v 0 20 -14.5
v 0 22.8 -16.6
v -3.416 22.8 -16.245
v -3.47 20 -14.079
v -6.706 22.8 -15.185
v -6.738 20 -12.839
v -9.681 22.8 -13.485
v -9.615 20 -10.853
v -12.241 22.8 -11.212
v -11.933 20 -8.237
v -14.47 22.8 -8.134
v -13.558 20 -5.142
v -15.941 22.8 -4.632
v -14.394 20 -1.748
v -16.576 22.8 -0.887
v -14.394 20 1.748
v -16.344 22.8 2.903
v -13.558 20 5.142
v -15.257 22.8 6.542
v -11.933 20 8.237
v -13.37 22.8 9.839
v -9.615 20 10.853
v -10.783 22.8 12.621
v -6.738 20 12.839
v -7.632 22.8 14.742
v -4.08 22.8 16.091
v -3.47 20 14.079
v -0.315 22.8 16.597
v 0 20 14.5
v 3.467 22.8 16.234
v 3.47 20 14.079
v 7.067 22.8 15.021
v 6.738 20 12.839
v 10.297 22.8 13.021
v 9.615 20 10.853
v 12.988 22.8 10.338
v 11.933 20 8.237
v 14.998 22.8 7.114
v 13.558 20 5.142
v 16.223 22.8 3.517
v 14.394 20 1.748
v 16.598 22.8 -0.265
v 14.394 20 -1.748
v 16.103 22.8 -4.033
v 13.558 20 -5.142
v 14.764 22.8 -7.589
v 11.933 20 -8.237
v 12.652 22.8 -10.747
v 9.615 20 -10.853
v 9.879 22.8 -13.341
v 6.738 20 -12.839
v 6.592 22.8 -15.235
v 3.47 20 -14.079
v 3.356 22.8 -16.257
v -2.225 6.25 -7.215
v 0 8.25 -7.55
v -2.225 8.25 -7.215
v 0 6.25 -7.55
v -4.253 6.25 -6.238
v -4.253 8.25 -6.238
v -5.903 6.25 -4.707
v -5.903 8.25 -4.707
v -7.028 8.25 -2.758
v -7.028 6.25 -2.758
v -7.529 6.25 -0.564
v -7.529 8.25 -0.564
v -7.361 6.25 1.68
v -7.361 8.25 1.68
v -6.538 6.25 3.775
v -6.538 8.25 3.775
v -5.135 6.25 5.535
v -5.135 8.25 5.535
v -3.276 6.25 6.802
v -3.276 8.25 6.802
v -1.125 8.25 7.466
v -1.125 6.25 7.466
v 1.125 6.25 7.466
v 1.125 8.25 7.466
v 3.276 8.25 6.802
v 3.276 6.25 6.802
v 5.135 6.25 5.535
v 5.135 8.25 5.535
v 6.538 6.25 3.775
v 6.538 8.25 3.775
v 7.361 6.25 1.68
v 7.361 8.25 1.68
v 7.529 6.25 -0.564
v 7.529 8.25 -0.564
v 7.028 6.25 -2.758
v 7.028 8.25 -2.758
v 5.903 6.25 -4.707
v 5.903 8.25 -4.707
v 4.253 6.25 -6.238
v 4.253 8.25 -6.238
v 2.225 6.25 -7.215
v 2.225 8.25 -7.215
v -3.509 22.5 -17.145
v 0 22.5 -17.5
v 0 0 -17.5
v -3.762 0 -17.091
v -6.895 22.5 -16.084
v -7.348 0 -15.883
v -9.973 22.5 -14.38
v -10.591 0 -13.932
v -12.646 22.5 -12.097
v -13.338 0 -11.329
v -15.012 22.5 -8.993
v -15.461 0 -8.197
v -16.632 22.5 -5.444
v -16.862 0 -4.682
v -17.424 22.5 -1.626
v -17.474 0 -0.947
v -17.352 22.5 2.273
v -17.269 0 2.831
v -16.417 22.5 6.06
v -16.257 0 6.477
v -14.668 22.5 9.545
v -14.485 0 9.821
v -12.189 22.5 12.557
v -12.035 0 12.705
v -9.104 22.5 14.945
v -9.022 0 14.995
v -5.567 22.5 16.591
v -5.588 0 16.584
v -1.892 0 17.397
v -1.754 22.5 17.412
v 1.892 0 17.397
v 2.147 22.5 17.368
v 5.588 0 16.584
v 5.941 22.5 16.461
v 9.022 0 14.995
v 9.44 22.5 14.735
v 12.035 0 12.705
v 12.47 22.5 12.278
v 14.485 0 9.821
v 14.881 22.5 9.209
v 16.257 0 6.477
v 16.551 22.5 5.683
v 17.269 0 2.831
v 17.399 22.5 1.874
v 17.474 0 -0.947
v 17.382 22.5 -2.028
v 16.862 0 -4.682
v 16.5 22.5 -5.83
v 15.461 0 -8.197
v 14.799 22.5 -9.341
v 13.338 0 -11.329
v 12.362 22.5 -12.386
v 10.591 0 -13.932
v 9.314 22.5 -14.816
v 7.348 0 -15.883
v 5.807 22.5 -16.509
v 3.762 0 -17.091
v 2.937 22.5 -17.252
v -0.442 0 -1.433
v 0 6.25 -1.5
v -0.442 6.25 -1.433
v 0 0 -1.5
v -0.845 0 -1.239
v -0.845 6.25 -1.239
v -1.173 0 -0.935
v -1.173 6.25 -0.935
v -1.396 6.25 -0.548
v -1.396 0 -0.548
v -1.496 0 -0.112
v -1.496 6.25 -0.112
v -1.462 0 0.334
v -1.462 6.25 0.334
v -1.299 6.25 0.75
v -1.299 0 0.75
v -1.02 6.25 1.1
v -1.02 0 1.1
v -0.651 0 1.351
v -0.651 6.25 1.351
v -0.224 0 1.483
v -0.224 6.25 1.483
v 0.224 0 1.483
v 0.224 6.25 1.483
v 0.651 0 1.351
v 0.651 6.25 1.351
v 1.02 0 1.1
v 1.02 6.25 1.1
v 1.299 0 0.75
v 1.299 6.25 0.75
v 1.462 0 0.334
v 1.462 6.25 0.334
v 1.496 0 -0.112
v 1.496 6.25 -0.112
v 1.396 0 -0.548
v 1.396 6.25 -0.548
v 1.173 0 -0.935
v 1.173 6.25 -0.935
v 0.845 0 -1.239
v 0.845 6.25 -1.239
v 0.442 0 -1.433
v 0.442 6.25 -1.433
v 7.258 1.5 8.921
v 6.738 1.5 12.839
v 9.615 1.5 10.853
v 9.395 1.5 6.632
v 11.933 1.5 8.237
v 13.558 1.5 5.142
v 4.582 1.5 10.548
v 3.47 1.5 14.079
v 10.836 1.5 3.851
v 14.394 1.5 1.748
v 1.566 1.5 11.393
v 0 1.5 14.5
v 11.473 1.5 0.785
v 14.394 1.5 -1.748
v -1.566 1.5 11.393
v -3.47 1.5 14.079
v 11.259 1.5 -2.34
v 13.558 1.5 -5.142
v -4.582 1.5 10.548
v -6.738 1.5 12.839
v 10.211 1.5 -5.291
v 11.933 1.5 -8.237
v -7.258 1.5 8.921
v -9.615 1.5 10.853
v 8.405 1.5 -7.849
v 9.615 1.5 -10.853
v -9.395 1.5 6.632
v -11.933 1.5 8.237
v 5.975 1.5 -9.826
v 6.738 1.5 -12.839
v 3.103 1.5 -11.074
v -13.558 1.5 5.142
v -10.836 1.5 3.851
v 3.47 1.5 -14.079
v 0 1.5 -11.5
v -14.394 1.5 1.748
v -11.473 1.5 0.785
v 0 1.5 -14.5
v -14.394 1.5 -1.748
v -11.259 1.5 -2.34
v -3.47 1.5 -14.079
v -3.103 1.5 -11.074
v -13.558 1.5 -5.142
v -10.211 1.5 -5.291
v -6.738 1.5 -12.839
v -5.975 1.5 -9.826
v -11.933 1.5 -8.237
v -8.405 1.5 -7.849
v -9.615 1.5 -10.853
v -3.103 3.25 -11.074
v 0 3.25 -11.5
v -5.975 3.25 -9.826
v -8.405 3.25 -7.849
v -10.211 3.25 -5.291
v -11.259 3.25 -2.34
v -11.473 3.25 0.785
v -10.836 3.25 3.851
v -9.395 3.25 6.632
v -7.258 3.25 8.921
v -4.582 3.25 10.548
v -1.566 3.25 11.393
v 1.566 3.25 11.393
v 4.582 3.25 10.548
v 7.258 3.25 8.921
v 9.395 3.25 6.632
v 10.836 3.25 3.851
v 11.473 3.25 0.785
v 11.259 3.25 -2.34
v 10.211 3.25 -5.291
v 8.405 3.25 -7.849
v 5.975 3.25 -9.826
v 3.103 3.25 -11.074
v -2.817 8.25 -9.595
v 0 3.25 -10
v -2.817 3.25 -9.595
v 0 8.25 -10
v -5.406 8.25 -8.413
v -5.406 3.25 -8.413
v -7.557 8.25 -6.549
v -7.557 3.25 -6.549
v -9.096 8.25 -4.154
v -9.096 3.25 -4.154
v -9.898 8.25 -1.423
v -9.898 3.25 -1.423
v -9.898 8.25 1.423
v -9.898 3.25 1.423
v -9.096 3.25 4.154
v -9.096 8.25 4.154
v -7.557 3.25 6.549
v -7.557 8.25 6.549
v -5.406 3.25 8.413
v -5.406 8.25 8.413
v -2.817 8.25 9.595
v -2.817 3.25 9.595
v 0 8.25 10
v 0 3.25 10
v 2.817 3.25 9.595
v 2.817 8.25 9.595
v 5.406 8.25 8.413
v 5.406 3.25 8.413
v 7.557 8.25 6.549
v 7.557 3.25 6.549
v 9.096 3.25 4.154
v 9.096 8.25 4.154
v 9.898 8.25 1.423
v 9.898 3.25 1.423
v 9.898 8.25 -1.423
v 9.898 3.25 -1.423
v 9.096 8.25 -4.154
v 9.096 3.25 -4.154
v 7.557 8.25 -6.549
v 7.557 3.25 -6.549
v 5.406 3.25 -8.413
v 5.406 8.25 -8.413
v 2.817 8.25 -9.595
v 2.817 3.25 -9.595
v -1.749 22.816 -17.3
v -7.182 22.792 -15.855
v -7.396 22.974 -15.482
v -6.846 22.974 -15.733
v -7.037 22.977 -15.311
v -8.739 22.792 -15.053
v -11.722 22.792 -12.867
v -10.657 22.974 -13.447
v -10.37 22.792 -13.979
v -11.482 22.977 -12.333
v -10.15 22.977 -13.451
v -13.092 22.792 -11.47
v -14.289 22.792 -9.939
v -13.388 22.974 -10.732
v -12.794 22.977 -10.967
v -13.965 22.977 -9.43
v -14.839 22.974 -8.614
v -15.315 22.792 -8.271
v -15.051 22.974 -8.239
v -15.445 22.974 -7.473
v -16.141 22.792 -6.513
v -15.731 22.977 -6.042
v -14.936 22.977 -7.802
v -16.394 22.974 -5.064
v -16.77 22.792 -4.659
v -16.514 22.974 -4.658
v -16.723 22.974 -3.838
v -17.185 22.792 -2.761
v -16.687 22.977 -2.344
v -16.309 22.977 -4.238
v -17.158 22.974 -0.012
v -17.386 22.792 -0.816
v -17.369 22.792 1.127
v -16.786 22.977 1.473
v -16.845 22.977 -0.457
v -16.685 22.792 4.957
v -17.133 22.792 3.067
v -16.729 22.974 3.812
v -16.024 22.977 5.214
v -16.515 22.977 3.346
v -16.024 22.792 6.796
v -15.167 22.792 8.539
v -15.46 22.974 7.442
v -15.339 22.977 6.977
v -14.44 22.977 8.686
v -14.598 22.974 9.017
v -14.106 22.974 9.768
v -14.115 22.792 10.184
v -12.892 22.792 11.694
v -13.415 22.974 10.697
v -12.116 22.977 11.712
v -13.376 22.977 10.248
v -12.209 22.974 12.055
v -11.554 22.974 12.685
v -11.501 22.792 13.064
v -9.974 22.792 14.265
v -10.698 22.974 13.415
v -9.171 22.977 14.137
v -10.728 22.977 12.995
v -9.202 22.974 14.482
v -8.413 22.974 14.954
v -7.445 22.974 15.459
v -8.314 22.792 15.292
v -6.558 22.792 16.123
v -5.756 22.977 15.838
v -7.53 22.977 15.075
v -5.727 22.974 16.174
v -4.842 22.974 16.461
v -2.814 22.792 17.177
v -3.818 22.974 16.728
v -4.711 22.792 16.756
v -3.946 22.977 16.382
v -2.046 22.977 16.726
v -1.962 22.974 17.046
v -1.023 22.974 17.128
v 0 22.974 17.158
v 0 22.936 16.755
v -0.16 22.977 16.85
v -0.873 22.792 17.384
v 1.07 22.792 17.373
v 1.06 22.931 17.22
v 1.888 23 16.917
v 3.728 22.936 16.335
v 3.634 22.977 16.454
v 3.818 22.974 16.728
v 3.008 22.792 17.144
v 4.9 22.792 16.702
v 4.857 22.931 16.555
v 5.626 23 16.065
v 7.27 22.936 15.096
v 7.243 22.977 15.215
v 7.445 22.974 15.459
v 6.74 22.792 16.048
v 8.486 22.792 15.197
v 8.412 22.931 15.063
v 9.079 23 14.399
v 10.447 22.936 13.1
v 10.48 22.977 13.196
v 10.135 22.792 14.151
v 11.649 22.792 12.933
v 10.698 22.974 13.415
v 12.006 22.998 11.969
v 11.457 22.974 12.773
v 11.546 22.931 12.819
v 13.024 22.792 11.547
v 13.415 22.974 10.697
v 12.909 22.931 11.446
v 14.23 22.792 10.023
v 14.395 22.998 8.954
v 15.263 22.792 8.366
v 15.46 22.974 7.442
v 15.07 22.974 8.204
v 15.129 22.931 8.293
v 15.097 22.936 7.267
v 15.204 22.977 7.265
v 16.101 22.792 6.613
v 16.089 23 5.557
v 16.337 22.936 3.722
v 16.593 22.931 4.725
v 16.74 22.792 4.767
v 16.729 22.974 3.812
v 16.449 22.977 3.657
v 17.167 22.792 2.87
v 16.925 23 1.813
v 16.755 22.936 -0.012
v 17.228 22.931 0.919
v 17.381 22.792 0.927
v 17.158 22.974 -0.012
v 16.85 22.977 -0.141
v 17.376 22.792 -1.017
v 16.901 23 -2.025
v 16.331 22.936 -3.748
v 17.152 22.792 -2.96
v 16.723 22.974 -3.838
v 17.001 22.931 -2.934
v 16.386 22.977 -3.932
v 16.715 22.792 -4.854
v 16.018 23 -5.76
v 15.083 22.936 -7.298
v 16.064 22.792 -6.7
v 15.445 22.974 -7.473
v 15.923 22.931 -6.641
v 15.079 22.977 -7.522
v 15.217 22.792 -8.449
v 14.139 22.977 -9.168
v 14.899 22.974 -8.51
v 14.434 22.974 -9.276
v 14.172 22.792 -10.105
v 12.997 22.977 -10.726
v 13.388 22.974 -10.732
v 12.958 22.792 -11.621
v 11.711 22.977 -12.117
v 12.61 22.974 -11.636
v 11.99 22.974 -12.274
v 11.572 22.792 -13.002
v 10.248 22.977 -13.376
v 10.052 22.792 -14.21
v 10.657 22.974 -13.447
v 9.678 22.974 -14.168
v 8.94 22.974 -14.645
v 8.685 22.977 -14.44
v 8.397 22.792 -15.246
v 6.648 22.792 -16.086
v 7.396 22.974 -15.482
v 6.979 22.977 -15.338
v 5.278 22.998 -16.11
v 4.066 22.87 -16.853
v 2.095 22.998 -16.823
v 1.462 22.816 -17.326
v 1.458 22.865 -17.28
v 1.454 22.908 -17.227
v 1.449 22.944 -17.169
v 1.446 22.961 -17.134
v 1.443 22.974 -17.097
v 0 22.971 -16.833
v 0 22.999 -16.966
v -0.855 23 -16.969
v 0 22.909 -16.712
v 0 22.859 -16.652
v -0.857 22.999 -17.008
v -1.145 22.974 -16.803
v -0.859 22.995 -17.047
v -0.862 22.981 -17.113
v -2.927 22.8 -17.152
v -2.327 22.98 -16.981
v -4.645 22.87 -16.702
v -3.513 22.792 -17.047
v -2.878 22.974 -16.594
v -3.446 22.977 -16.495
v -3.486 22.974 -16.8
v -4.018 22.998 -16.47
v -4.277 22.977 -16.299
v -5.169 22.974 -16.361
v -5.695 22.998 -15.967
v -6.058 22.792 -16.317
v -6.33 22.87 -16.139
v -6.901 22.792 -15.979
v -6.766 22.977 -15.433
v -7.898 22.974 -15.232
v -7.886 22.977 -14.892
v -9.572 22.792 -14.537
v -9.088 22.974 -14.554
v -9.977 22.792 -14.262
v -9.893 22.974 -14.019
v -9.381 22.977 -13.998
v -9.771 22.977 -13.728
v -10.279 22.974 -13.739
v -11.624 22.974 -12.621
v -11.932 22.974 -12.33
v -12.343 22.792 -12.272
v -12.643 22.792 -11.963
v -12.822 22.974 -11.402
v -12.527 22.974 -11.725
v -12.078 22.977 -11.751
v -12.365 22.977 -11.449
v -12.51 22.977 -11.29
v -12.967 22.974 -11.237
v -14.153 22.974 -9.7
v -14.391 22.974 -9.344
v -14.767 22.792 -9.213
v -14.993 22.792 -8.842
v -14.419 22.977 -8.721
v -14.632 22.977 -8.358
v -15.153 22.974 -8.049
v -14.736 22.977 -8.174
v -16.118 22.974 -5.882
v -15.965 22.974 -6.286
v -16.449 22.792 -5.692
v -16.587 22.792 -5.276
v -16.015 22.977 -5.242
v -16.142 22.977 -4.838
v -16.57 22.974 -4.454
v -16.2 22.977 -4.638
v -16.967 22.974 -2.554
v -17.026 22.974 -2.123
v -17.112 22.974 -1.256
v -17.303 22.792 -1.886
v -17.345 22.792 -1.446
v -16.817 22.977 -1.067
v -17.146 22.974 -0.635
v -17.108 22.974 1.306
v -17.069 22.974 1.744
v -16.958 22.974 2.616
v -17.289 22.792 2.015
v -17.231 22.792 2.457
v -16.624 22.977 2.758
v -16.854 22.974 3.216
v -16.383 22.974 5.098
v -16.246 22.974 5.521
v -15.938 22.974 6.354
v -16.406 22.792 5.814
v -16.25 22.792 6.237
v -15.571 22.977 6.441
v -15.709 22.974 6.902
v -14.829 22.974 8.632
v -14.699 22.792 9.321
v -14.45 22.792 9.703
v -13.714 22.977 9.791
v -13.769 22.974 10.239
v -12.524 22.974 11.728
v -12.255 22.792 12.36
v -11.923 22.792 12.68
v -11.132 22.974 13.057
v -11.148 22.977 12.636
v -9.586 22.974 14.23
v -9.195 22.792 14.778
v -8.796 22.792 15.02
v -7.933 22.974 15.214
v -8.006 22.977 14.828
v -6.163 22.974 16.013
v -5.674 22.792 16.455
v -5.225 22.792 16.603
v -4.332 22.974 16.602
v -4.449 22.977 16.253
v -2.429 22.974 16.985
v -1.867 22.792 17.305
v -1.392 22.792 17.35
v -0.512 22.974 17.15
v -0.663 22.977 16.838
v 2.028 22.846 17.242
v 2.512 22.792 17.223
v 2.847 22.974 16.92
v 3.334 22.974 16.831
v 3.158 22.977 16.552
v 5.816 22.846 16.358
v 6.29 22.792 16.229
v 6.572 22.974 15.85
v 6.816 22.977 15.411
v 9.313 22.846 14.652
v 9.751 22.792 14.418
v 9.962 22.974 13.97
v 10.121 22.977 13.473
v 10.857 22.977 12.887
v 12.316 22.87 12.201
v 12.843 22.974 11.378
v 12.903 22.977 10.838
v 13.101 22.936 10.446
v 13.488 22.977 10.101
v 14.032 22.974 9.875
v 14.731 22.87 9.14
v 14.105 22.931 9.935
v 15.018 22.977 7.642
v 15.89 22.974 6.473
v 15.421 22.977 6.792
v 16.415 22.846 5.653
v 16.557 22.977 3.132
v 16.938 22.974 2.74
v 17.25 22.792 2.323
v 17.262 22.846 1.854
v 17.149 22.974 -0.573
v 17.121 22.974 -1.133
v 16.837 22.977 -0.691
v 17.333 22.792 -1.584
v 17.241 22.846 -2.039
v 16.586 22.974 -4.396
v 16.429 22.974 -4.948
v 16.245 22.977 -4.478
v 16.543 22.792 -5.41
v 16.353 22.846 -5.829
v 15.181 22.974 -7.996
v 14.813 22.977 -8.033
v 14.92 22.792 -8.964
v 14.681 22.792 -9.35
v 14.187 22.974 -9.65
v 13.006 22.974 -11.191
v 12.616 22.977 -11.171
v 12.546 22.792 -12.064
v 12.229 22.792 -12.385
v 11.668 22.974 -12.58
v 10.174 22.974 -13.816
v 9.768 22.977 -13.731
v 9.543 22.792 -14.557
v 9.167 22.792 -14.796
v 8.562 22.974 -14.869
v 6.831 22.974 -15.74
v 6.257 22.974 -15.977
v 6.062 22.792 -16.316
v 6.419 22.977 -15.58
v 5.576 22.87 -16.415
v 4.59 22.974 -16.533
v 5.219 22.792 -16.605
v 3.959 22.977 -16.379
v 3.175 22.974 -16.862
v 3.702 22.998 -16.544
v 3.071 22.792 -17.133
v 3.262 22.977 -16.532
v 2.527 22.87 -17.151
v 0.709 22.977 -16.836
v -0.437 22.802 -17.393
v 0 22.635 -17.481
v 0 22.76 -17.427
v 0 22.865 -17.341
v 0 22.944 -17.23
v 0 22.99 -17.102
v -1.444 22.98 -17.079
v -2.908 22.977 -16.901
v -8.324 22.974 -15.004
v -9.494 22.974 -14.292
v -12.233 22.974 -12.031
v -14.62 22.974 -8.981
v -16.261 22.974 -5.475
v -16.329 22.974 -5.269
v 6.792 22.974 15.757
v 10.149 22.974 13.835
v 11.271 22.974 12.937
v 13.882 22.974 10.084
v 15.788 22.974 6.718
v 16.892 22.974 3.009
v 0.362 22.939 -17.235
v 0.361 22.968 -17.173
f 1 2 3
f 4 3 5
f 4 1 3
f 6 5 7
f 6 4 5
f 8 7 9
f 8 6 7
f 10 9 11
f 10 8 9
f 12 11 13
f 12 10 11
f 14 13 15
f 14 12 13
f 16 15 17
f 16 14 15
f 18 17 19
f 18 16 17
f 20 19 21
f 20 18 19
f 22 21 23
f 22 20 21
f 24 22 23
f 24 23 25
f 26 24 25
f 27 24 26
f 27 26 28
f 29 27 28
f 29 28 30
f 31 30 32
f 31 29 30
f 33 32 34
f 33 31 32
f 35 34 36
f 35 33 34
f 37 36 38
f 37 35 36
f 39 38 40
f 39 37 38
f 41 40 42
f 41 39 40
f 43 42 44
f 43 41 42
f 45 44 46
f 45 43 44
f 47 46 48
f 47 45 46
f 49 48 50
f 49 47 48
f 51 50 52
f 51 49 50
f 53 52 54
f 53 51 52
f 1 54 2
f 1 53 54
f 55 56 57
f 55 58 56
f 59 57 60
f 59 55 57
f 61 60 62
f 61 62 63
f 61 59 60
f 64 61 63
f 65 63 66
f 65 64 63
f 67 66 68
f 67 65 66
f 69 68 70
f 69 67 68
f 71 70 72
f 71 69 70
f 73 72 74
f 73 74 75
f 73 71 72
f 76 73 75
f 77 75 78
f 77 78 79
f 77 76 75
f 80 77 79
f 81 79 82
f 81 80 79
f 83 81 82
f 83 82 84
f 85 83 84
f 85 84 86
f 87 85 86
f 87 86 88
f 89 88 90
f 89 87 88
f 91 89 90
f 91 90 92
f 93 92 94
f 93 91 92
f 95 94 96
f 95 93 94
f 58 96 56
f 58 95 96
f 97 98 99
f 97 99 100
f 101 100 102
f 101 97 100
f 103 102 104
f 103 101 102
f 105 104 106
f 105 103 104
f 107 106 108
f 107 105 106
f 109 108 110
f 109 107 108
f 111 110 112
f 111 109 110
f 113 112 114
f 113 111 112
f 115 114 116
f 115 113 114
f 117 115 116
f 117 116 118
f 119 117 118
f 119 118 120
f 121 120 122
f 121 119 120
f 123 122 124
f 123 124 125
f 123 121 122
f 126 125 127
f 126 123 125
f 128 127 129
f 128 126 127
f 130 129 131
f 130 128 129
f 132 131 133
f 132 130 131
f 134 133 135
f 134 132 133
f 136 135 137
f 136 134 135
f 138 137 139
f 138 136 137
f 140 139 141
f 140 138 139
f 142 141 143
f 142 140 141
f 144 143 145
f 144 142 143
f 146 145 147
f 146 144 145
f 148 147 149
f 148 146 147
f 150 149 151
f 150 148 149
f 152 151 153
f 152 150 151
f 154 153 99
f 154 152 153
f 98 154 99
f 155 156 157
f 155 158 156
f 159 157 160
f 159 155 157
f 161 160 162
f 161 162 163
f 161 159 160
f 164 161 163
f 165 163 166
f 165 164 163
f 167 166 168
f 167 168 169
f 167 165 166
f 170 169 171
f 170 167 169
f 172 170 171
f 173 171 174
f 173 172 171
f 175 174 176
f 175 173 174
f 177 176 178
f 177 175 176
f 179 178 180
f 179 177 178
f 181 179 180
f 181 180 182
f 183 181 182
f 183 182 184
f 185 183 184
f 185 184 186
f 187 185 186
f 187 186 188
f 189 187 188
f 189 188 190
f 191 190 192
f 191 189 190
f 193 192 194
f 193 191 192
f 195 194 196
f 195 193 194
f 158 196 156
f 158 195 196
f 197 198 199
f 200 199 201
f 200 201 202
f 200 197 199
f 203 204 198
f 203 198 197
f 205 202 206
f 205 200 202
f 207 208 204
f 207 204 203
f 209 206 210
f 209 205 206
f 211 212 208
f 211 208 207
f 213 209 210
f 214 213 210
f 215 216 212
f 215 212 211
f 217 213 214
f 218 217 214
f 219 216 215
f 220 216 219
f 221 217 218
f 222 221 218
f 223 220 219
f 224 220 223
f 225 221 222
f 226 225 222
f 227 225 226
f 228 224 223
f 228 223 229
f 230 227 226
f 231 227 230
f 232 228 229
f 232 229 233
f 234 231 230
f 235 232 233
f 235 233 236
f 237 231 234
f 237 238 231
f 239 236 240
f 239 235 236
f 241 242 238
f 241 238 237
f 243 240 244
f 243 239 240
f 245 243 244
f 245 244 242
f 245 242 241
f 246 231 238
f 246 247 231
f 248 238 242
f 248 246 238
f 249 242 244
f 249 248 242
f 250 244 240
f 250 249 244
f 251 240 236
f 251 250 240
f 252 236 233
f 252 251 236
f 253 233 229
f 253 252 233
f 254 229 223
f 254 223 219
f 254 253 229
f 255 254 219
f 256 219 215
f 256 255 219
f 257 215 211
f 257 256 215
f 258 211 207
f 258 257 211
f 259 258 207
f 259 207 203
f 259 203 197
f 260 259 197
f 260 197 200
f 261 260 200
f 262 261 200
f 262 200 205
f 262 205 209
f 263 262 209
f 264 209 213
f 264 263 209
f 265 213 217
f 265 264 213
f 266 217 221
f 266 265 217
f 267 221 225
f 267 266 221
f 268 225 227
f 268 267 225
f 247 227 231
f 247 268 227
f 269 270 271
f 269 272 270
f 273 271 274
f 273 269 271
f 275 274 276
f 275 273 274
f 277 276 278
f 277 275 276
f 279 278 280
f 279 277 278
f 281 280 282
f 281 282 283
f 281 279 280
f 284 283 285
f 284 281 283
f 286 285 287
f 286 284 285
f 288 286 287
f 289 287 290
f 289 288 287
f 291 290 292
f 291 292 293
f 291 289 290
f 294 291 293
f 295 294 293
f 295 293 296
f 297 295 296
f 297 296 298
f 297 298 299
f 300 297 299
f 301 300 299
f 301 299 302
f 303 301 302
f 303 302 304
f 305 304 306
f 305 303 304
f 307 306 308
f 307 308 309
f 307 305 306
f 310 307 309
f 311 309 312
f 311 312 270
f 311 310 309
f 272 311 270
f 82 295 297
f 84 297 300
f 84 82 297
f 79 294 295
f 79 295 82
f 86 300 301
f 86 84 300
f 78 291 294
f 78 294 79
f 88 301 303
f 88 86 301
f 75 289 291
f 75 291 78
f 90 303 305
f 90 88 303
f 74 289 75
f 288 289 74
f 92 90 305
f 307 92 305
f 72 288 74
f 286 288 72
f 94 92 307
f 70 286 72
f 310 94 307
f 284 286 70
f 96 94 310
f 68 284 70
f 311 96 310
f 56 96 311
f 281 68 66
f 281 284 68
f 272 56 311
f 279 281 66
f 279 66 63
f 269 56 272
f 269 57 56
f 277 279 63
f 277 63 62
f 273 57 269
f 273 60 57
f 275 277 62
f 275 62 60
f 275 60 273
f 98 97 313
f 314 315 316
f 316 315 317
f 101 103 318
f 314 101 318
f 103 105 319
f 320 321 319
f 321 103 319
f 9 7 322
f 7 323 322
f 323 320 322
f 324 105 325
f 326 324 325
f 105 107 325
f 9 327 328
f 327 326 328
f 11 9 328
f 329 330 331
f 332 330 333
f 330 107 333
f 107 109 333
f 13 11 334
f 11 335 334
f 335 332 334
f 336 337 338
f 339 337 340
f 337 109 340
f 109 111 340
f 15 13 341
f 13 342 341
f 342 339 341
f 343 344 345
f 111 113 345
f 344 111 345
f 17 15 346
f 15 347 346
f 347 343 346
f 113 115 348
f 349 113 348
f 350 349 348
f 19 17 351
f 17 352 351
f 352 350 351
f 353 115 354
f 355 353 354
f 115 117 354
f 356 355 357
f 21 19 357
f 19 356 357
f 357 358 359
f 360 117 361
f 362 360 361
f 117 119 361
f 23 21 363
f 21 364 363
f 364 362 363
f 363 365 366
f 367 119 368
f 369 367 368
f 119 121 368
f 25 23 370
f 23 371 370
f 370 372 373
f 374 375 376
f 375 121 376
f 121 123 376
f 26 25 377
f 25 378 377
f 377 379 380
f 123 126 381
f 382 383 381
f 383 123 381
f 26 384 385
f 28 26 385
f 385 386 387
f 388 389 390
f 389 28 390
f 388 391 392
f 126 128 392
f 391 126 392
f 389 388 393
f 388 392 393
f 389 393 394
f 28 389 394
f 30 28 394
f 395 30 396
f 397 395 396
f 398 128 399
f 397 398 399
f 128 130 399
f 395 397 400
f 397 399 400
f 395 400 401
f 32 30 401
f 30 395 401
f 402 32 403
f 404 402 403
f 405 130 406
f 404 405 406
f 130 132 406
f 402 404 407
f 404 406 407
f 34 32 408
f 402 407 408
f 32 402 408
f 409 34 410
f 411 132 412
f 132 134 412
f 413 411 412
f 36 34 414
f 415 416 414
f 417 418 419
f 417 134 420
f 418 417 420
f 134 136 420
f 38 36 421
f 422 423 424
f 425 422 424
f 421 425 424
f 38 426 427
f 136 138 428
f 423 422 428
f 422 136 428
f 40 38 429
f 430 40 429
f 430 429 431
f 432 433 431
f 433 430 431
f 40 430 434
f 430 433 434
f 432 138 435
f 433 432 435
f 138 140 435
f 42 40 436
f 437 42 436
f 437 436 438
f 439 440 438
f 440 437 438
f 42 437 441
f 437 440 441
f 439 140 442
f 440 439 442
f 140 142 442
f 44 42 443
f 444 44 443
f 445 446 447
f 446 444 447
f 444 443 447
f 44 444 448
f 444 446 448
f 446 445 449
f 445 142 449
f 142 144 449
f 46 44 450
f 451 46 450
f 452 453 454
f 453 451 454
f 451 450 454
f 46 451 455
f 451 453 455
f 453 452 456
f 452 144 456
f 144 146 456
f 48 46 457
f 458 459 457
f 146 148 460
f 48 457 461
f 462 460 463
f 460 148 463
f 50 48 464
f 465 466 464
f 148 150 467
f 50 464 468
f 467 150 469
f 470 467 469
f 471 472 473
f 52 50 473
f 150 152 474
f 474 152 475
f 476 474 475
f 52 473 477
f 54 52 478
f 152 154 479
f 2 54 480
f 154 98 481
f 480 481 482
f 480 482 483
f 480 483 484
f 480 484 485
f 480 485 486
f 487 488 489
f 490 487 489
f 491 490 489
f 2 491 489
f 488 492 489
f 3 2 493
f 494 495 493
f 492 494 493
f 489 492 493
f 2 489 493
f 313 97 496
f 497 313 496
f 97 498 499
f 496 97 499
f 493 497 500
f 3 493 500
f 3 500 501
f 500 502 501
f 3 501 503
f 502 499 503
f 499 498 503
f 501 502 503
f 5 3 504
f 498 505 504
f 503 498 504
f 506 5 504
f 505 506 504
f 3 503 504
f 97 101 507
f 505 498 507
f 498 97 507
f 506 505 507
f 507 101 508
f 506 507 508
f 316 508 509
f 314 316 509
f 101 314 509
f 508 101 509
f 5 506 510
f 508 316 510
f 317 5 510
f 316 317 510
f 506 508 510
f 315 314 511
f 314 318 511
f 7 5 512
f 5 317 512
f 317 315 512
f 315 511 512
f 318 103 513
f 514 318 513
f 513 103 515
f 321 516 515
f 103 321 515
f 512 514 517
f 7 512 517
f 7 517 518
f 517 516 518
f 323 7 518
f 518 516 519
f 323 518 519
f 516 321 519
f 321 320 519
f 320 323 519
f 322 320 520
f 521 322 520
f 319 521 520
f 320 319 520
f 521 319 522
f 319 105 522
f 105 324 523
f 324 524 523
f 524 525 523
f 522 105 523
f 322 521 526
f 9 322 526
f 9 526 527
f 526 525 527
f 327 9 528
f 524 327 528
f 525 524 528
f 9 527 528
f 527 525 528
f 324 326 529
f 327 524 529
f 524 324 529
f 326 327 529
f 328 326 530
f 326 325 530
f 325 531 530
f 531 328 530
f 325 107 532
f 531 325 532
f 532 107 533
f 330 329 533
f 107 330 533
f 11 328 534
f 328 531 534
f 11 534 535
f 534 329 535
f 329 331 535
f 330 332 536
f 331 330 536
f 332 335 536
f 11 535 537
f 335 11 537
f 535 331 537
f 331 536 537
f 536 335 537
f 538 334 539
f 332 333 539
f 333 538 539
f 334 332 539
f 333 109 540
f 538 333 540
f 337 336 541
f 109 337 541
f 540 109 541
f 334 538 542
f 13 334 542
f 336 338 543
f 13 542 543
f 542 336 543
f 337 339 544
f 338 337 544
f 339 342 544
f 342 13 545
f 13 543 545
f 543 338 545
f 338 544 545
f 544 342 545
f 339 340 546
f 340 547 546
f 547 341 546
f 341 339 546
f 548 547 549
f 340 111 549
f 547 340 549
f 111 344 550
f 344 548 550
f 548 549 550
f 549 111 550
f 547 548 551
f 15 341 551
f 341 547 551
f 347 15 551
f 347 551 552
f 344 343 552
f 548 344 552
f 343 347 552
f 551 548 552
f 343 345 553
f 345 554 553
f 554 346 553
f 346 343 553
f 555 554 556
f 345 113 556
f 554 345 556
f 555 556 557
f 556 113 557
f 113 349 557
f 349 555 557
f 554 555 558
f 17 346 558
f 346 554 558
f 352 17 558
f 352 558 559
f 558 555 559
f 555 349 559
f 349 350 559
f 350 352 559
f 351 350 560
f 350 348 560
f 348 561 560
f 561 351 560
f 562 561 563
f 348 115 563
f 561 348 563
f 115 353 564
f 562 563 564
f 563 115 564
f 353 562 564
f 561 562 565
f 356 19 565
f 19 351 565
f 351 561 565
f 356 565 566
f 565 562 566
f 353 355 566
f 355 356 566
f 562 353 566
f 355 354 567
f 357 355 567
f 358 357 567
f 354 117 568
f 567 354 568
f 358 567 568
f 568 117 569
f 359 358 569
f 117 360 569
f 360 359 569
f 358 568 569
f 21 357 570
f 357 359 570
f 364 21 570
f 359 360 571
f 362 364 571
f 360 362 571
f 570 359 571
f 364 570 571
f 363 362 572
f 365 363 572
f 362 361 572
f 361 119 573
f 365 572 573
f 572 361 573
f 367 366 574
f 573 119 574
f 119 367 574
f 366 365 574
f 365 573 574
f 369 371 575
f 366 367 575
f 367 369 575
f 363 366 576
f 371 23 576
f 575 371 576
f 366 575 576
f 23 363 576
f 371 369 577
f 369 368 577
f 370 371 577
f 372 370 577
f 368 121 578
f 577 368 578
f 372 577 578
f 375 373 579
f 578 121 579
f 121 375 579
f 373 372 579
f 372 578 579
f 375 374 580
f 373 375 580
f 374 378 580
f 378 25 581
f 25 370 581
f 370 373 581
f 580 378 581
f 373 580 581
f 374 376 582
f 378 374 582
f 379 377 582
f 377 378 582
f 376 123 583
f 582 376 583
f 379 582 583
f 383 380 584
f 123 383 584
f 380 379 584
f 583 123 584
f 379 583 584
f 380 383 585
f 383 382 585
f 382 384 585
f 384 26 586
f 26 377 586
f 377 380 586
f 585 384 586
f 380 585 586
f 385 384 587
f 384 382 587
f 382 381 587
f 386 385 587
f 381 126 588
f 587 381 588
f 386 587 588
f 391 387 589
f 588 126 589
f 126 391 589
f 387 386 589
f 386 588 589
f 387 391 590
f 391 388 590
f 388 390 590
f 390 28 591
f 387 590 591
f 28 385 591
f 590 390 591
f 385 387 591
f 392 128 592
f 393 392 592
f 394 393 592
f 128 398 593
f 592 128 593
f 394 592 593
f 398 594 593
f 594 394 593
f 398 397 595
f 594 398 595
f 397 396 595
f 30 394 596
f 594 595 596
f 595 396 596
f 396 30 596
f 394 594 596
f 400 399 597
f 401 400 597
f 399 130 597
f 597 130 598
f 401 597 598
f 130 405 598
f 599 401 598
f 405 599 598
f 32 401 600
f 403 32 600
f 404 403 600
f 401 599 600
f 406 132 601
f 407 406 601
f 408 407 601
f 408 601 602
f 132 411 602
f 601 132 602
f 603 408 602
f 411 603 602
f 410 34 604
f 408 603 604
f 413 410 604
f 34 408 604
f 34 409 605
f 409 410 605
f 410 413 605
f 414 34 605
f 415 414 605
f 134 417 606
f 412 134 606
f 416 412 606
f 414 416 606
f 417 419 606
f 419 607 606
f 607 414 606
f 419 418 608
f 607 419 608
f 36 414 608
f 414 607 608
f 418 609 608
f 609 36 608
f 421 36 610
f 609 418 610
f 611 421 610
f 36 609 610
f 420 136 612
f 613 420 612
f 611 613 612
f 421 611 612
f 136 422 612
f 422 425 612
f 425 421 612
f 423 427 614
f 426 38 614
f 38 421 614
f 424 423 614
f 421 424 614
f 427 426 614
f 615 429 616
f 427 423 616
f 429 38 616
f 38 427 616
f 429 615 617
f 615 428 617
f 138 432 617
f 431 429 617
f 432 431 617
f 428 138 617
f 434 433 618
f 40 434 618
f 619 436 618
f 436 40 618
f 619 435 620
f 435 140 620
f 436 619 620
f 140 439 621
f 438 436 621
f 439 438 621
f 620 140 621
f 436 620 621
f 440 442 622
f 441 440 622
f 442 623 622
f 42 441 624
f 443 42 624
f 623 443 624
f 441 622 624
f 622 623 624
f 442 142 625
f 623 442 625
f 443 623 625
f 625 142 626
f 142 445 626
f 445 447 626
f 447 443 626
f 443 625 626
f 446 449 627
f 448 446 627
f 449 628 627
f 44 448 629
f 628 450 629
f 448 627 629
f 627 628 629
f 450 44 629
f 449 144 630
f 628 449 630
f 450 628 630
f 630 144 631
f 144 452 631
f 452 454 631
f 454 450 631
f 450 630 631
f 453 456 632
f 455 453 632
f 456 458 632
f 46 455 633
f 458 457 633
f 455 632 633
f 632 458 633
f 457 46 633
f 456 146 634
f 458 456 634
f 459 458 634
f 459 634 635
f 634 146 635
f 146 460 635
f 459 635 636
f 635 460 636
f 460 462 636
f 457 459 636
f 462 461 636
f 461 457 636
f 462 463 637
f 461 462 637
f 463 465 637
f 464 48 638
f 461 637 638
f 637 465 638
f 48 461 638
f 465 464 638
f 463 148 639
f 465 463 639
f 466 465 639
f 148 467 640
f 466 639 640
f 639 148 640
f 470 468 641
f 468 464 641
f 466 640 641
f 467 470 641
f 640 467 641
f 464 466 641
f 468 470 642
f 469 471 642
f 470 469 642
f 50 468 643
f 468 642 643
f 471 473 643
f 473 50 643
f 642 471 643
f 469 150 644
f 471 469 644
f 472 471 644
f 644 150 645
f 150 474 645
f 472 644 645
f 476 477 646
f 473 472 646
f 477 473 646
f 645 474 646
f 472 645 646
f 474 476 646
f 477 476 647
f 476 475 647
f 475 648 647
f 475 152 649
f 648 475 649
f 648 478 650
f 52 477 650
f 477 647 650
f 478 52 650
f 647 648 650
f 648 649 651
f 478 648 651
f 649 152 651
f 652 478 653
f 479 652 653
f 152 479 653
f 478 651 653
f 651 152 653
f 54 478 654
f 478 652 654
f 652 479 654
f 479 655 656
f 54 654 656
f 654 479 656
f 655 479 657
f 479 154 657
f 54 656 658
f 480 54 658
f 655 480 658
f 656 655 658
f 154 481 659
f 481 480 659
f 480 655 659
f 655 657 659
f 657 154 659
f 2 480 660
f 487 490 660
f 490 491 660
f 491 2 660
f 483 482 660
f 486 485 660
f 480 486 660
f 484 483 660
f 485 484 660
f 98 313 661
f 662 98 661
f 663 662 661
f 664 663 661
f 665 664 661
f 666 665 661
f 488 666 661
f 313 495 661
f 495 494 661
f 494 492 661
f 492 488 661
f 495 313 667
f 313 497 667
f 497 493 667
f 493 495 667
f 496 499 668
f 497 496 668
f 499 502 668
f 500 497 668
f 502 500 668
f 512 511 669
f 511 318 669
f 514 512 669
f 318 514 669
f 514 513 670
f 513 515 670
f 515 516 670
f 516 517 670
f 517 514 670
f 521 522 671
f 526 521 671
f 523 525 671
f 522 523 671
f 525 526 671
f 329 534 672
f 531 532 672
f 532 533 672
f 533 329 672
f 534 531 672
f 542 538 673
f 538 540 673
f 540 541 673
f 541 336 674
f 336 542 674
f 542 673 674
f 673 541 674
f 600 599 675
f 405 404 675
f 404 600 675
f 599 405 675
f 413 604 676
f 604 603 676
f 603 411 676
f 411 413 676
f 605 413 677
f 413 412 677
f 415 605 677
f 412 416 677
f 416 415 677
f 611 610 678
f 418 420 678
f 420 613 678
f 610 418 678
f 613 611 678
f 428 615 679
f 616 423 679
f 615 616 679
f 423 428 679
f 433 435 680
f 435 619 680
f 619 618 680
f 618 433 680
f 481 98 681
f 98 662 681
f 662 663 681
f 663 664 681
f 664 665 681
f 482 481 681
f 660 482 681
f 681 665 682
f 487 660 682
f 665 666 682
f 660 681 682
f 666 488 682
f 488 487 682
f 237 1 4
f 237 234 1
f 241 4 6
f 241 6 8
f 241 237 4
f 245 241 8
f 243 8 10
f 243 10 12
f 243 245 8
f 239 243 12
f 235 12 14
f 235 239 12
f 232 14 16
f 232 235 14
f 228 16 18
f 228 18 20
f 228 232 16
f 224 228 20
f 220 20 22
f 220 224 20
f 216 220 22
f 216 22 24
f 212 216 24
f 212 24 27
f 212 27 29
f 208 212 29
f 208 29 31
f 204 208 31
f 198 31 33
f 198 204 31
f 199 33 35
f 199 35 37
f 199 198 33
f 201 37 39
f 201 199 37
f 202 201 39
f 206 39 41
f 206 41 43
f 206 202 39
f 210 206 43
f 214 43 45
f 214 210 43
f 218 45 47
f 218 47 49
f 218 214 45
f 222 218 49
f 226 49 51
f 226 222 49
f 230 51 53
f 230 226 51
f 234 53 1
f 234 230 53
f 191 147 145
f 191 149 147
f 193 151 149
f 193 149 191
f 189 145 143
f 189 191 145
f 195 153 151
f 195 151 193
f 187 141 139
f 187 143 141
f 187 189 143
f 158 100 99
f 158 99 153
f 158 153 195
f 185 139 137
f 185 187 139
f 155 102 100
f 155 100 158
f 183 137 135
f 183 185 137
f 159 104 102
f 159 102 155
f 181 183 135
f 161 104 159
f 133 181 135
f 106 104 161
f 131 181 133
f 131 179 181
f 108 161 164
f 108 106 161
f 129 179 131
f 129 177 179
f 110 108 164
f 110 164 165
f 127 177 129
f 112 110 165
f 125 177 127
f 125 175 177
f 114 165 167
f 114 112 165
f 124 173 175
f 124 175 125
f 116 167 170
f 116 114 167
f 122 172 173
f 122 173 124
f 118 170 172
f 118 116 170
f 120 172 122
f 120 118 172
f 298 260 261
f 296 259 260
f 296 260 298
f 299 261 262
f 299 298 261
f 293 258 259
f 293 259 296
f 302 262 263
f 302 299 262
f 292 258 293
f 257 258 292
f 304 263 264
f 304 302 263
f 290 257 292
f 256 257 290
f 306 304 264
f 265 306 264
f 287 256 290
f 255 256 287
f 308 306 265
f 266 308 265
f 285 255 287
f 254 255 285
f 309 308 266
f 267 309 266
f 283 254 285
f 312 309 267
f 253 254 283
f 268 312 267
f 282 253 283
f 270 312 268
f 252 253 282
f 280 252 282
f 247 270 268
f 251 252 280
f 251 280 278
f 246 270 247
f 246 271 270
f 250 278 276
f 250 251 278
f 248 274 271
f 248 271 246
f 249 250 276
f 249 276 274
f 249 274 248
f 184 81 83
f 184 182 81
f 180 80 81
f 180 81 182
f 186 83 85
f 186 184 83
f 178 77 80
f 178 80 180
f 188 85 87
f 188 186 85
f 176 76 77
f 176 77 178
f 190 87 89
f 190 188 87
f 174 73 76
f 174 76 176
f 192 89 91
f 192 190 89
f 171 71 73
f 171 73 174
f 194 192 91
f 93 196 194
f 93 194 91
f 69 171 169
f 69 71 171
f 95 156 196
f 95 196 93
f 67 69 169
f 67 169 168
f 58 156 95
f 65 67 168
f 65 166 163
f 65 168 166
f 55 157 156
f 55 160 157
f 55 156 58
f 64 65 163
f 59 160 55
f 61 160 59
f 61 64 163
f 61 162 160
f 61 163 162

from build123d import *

# Parameters (mm, degrees)
FILLET_1_R = 0.5


with BuildPart() as part:
    # Эскиз1 → Повернуть1 (revolve)
    with BuildSketch(Plane(origin=(0, 0, 0), x_dir=(0, 0, -1), z_dir=(1, 0, 0))):
        Polygon((1.5, 0), (17.5, 0), (17.5, 24), (14.5, 20), (14.5, 1.5), (11.5, 1.5), (11.5, 3.25), (10, 3.25), (10, 8.25), (7.55, 8.25), (7.55, 6.25), (1.5, 6.25), align=None)
    revolve(axis=Axis((0, 0, 0), (0, 1, 0)))

    # Скругление1
    fillet_1_edges = [part.edges().sort_by_distance(p)[0] for p in [
        (0, 24, 17.5),
    ]]
    fillet(fillet_1_edges, radius=FILLET_1_R)


solid = part.part
